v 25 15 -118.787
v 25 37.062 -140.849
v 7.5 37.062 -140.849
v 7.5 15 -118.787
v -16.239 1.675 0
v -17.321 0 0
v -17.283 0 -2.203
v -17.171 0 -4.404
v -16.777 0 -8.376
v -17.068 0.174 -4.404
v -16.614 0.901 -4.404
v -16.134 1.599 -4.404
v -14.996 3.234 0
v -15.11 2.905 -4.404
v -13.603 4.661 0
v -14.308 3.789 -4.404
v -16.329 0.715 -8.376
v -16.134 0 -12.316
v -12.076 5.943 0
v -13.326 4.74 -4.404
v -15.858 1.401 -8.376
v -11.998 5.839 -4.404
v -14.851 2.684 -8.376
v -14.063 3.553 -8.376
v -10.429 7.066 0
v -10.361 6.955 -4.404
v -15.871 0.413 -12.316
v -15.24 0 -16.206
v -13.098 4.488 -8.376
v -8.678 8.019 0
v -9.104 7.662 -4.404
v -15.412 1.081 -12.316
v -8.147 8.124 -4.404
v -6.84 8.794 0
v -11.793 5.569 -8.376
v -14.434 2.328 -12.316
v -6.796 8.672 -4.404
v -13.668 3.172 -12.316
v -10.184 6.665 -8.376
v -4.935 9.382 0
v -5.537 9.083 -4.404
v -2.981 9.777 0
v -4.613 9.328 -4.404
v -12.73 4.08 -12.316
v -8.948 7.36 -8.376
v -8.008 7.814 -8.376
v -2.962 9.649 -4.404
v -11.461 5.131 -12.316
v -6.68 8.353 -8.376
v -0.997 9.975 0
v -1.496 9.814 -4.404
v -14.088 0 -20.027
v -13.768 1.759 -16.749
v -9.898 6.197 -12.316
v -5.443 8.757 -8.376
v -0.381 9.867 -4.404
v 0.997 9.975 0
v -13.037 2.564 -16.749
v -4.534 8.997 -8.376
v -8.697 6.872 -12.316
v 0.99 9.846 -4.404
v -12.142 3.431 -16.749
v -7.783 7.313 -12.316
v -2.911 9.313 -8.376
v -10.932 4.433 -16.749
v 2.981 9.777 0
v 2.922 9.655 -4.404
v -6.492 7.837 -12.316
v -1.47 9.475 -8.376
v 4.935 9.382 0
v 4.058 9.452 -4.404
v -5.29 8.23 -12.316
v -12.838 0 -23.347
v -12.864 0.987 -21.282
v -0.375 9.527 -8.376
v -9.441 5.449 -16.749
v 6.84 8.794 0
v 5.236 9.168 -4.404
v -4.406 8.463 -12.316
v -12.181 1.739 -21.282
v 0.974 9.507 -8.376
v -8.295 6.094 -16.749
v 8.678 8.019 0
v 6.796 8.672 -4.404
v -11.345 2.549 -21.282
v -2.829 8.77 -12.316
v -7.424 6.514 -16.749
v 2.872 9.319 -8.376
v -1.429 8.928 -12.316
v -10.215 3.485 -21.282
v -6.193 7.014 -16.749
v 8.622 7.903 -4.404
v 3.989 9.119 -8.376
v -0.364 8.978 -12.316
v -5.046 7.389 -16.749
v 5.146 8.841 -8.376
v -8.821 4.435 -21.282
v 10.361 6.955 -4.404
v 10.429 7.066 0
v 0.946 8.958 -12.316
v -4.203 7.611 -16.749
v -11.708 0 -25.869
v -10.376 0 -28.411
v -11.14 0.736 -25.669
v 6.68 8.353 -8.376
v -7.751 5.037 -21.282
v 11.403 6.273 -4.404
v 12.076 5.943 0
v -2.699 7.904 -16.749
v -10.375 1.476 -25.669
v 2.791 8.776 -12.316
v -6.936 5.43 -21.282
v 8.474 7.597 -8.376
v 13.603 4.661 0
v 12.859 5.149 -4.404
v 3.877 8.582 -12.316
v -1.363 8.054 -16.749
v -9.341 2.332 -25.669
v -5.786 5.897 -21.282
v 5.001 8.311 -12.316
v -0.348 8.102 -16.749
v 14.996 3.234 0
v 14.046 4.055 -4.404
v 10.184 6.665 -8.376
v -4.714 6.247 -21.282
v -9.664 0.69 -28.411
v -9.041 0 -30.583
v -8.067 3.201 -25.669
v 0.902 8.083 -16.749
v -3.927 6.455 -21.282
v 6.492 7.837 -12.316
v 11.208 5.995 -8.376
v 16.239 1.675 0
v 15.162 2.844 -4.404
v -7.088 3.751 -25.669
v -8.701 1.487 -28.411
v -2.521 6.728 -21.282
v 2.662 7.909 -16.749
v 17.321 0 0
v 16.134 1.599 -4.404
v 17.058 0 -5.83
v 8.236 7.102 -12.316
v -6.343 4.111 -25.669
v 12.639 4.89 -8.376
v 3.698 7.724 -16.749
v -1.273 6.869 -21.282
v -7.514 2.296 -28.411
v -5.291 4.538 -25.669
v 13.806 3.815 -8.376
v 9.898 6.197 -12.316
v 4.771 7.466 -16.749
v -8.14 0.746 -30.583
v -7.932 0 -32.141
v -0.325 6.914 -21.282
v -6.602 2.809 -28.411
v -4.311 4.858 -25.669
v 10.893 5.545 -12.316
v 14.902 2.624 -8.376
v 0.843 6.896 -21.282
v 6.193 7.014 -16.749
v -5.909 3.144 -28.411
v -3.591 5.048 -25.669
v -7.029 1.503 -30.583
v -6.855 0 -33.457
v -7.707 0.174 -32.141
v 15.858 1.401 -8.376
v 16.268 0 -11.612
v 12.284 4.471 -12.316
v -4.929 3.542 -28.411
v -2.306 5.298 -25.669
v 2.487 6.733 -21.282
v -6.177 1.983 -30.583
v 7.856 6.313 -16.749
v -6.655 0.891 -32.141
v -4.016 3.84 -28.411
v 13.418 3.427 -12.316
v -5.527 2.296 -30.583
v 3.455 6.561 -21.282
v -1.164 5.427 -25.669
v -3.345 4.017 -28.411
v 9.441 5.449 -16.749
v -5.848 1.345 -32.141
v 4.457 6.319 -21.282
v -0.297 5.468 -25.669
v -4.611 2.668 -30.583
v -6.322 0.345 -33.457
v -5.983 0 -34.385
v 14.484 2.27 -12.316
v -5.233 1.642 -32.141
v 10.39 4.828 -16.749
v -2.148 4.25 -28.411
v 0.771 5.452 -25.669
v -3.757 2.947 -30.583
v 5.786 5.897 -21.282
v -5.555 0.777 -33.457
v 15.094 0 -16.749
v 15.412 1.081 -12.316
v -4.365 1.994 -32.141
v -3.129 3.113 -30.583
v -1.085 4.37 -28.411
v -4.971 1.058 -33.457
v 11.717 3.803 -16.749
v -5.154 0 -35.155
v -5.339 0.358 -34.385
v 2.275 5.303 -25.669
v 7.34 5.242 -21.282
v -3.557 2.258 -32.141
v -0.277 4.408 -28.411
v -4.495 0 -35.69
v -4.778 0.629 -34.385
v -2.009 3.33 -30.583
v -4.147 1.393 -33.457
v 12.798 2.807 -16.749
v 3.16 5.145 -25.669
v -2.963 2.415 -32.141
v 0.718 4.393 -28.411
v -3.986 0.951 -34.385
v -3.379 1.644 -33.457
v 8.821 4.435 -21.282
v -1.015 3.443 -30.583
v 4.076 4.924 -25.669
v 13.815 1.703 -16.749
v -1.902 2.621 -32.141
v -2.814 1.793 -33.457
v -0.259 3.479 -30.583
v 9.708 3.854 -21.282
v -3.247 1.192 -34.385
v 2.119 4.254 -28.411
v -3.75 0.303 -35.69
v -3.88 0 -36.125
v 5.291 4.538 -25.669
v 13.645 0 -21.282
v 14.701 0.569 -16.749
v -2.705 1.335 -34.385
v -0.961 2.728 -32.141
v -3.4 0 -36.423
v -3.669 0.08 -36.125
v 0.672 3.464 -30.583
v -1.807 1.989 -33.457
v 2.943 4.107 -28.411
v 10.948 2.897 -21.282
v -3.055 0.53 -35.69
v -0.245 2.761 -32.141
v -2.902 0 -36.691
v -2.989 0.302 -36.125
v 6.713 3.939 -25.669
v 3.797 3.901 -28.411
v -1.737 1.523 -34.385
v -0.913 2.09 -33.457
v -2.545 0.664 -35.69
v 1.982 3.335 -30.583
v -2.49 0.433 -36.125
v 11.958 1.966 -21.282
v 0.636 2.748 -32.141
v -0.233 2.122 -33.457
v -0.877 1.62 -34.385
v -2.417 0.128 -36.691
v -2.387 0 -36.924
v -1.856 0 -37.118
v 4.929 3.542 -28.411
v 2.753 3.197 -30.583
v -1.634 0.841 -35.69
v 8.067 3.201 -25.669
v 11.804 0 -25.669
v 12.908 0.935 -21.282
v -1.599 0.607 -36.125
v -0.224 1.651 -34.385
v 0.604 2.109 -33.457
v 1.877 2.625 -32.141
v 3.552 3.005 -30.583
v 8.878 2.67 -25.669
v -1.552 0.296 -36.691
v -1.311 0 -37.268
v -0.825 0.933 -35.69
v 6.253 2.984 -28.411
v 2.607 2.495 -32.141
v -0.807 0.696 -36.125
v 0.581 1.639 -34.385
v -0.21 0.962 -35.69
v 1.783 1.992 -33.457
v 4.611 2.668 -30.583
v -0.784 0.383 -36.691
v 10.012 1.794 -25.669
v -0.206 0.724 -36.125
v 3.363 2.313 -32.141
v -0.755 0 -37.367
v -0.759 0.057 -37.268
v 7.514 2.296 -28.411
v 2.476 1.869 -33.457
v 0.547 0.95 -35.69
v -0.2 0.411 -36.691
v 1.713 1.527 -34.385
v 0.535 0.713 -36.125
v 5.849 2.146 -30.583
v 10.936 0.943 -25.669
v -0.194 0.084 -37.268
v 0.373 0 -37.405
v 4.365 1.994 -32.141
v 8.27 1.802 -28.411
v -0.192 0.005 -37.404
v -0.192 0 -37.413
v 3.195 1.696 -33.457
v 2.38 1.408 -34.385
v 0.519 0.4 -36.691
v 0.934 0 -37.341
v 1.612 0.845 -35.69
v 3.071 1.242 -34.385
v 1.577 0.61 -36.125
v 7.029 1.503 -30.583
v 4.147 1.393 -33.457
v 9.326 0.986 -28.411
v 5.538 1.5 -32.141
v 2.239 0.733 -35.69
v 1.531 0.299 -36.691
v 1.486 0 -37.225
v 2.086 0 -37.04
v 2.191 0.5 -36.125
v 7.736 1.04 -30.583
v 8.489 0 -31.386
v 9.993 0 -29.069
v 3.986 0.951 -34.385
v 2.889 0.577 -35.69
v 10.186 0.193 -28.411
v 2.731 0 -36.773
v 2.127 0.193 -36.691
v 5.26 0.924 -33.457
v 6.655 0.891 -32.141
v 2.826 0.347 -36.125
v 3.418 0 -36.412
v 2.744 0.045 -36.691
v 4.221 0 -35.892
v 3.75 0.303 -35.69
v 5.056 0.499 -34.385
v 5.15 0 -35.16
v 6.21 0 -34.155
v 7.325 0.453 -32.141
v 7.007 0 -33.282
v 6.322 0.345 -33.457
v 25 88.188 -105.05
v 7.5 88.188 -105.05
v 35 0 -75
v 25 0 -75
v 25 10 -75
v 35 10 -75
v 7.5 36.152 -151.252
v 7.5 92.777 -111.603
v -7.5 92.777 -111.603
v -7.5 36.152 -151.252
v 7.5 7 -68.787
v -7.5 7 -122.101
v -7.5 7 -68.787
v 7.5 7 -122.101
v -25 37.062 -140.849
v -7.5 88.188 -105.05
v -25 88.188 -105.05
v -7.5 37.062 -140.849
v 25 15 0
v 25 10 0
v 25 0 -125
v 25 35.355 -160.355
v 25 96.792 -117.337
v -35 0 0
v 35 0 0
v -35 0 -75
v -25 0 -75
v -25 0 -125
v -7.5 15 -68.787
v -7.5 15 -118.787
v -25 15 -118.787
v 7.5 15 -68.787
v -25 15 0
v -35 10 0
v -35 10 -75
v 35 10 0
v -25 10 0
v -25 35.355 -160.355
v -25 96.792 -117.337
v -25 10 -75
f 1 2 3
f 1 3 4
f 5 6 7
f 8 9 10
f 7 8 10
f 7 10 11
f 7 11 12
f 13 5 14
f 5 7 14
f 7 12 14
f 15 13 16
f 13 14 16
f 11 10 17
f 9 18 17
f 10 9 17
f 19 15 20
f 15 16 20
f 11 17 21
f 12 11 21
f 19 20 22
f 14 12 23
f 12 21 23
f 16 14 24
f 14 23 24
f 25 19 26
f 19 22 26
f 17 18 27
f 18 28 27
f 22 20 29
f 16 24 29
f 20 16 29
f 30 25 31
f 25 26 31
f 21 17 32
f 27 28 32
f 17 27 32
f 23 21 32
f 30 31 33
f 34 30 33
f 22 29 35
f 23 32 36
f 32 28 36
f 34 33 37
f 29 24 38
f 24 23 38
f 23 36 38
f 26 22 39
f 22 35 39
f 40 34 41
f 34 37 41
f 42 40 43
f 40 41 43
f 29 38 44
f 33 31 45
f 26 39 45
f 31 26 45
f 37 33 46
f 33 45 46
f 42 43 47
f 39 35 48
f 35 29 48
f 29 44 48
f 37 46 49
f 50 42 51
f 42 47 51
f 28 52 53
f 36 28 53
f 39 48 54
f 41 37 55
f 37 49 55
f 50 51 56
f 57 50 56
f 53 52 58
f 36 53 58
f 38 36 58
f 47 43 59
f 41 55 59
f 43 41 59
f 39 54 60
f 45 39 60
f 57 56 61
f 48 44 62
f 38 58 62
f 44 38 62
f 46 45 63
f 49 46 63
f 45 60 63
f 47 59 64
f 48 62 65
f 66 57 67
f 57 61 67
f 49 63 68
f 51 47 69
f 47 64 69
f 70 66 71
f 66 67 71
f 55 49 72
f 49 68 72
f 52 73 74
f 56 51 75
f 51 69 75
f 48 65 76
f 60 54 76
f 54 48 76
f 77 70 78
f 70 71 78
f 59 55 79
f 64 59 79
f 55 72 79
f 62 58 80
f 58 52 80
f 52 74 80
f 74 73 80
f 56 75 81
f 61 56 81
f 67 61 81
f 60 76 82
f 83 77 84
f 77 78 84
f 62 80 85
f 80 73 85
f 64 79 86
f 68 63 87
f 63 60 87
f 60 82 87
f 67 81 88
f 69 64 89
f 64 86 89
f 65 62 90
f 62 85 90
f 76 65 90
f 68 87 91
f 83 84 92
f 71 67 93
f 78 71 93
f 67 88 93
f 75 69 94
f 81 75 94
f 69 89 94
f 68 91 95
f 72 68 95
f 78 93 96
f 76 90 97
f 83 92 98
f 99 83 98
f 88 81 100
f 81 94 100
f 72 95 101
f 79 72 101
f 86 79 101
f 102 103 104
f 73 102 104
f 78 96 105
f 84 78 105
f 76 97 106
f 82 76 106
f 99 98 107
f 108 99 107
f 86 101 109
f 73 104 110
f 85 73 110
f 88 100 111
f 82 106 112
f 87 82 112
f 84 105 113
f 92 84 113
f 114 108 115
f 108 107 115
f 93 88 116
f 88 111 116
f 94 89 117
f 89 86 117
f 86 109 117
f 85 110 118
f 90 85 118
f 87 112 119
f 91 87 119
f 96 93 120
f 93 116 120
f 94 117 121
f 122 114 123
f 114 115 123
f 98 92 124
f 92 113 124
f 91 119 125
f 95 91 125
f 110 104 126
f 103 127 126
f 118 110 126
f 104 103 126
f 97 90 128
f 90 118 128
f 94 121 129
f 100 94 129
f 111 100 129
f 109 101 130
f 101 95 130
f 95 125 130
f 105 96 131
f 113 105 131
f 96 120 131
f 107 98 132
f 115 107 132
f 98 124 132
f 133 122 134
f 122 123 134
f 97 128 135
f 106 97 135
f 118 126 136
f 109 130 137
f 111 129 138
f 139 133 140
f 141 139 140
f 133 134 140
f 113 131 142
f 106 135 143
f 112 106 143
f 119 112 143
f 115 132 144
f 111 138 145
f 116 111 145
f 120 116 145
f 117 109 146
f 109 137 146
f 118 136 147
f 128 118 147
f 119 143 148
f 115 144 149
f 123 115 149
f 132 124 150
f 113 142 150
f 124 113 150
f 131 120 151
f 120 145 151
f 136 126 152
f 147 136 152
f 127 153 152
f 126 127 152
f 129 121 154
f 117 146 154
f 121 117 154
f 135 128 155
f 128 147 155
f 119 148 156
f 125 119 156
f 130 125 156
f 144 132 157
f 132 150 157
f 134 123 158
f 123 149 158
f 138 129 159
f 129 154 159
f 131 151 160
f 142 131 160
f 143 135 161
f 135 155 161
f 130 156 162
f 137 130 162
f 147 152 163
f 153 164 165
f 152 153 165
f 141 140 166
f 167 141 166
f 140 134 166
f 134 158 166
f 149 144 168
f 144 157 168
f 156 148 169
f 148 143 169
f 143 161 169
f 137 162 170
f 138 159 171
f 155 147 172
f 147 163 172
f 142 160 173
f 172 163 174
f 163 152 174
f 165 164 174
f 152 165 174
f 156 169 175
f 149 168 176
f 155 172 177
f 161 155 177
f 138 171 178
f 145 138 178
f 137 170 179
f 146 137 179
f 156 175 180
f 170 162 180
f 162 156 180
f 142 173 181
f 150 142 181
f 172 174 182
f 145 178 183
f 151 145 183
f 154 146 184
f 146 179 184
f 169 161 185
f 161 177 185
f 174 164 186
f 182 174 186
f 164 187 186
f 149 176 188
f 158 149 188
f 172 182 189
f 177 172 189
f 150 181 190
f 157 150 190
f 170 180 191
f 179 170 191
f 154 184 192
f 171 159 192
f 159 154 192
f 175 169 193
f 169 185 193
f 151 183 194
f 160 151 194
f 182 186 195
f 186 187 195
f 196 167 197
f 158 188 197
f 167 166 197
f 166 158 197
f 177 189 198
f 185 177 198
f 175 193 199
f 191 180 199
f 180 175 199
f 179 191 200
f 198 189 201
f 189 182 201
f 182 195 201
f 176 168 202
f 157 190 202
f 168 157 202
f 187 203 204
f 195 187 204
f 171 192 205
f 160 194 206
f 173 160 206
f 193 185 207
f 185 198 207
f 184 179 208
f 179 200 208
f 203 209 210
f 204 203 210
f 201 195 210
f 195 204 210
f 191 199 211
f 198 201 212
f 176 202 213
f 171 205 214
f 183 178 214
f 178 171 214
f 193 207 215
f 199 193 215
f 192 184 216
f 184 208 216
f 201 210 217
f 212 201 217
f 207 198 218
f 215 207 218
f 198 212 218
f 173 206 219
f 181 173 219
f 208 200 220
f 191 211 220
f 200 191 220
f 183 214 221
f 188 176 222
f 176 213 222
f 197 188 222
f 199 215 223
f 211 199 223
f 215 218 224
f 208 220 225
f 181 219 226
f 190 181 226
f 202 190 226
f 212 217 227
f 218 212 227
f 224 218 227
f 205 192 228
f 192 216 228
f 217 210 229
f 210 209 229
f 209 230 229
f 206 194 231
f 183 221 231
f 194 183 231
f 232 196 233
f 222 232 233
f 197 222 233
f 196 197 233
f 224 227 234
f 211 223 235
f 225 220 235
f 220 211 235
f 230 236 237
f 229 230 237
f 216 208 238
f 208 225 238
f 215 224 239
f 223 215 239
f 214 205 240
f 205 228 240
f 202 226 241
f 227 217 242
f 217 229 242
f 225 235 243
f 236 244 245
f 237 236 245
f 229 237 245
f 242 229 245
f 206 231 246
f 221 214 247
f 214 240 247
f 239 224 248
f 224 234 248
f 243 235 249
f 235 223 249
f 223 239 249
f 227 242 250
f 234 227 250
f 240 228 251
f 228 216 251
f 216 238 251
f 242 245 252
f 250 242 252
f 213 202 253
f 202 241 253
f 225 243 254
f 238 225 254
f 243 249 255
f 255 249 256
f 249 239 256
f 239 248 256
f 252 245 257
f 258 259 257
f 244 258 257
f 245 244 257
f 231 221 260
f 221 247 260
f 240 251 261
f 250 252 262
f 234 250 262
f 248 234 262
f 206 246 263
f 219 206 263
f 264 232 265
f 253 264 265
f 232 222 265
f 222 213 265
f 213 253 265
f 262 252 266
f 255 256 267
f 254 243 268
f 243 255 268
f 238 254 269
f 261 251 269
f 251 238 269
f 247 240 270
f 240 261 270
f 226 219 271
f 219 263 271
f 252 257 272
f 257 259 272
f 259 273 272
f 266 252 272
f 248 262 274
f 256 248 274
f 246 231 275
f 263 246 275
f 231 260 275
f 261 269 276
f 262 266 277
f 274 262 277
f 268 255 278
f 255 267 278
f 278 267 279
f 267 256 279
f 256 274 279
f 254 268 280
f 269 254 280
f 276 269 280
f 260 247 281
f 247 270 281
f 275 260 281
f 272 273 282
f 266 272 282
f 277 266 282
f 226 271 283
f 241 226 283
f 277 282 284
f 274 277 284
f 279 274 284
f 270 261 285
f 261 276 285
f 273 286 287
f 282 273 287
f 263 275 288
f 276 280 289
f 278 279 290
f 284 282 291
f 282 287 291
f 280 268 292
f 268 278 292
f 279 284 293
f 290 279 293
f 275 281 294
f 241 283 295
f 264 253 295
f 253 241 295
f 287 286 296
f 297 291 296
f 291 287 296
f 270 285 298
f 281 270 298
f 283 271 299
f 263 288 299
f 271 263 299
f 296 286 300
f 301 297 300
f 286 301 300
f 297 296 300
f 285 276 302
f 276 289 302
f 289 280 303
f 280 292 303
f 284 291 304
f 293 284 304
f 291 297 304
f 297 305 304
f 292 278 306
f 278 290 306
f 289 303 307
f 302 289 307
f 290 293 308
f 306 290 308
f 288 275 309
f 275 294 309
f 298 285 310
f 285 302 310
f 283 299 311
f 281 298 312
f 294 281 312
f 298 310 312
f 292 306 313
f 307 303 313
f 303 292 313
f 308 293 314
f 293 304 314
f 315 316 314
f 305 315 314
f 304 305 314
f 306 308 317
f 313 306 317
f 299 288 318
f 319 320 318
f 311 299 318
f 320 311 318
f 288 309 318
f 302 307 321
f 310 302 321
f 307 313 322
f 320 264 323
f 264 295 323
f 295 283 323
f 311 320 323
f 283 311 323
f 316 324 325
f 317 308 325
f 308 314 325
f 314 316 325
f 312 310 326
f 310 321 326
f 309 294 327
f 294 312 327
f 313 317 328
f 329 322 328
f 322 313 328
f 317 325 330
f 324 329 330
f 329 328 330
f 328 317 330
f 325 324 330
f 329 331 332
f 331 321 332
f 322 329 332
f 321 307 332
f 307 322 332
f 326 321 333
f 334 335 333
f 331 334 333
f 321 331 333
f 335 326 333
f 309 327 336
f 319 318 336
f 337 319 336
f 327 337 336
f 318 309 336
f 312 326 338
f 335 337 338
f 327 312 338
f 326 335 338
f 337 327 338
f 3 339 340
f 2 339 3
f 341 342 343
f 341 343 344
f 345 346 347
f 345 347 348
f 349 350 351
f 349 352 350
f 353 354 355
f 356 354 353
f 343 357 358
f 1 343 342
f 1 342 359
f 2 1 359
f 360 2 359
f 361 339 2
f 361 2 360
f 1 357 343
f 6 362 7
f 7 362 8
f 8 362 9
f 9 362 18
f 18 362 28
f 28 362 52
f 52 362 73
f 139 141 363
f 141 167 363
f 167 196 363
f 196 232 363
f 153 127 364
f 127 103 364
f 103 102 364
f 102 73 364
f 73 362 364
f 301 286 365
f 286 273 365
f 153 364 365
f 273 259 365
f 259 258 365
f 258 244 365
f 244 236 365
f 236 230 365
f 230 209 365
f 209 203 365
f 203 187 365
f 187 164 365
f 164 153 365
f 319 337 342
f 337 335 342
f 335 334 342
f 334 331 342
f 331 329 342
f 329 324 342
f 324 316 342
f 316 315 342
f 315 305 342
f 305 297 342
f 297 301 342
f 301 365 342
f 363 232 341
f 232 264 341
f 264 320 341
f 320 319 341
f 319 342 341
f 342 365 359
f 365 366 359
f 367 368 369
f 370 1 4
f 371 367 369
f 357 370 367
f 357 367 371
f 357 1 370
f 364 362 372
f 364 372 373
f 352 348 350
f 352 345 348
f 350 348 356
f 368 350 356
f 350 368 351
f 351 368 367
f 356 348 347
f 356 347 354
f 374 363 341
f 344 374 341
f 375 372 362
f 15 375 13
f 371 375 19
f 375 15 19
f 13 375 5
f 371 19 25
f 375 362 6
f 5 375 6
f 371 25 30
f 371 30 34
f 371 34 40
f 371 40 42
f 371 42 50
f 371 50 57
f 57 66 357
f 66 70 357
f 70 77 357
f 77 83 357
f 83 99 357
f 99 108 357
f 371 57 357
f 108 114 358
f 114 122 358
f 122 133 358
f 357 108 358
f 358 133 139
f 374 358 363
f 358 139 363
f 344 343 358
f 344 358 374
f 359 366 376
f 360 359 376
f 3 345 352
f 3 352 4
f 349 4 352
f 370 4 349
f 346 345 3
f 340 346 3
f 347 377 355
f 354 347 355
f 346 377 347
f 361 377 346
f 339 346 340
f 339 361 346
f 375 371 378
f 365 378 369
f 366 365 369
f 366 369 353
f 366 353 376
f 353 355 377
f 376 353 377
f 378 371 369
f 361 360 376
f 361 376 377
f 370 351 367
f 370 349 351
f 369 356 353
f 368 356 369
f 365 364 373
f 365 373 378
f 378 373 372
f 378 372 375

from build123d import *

# Parameters (mm, degrees)
BOSS_EXTRUDE2_DEPTH = 25
CUT_EXTRUDE1_DEPTH  = 7.5
SKETCH4_W           = 10
SKETCH4_H           = 75
BOSS_EXTRUDE3_DEPTH = 10


with BuildPart() as part:
    # Sketch2 → Boss-Extrude2 (new, symmetric)
    with BuildSketch(Plane(origin=(0, 0, 0), x_dir=(0, 0, -1), z_dir=(1, 0, 0))):
        Polygon((0, 0), (125, 0), (160.355339059, 35.355339059), (117.337106333, 96.791742381), (105.049825669, 88.188095836), (140.848741752, 37.061945188), (118.786796564, 15), (0, 15), align=None)
    extrude(amount=BOSS_EXTRUDE2_DEPTH, both=True)

    # Sketch3 → Cut-Extrude1 (cut, symmetric)
    with BuildSketch(Plane(origin=(0, 0, 0), x_dir=(0, 0, -1), z_dir=(1, 0, 0))):
        Polygon((111.603042023, 92.776707327), (151.252260316, 36.151755253), (122.100505063, 7), (68.786796564, 7), (68.786796564, 15), (118.786796564, 15), (140.848741752, 37.061945188), (105.049825669, 88.188095836), align=None)
    extrude(amount=CUT_EXTRUDE1_DEPTH, both=True, mode=Mode.SUBTRACT)

    # Sketch4 → Boss-Extrude3 (add)
    with BuildSketch(Plane(origin=(0, 0, 0), x_dir=(1, 0, 0), z_dir=(0, 1, 0))):
        with Locations((-30, 37.5)):
            Rectangle(SKETCH4_W, SKETCH4_H)
        with Locations((30, 37.5)):
            Rectangle(SKETCH4_W, SKETCH4_H)
    extrude(amount=BOSS_EXTRUDE3_DEPTH)

    # Sketch8 → Cut-Revolve5 (revolve, cut)
    with BuildSketch(Plane(origin=(0, 0, 0), x_dir=(0, 0, -1), z_dir=(1, 0, 0))):
        with BuildLine():
            Line((0, 0), (0, 10))
            ThreePointArc((0, 10), (19.364916731, 7.456883731), (37.416573868, 0))
            Line((37.416573868, 0), (0, 0))
        make_face()
    revolve(axis=Axis((0, -10, 0), (0, 0, -1)), mode=Mode.SUBTRACT)


solid = part.part
